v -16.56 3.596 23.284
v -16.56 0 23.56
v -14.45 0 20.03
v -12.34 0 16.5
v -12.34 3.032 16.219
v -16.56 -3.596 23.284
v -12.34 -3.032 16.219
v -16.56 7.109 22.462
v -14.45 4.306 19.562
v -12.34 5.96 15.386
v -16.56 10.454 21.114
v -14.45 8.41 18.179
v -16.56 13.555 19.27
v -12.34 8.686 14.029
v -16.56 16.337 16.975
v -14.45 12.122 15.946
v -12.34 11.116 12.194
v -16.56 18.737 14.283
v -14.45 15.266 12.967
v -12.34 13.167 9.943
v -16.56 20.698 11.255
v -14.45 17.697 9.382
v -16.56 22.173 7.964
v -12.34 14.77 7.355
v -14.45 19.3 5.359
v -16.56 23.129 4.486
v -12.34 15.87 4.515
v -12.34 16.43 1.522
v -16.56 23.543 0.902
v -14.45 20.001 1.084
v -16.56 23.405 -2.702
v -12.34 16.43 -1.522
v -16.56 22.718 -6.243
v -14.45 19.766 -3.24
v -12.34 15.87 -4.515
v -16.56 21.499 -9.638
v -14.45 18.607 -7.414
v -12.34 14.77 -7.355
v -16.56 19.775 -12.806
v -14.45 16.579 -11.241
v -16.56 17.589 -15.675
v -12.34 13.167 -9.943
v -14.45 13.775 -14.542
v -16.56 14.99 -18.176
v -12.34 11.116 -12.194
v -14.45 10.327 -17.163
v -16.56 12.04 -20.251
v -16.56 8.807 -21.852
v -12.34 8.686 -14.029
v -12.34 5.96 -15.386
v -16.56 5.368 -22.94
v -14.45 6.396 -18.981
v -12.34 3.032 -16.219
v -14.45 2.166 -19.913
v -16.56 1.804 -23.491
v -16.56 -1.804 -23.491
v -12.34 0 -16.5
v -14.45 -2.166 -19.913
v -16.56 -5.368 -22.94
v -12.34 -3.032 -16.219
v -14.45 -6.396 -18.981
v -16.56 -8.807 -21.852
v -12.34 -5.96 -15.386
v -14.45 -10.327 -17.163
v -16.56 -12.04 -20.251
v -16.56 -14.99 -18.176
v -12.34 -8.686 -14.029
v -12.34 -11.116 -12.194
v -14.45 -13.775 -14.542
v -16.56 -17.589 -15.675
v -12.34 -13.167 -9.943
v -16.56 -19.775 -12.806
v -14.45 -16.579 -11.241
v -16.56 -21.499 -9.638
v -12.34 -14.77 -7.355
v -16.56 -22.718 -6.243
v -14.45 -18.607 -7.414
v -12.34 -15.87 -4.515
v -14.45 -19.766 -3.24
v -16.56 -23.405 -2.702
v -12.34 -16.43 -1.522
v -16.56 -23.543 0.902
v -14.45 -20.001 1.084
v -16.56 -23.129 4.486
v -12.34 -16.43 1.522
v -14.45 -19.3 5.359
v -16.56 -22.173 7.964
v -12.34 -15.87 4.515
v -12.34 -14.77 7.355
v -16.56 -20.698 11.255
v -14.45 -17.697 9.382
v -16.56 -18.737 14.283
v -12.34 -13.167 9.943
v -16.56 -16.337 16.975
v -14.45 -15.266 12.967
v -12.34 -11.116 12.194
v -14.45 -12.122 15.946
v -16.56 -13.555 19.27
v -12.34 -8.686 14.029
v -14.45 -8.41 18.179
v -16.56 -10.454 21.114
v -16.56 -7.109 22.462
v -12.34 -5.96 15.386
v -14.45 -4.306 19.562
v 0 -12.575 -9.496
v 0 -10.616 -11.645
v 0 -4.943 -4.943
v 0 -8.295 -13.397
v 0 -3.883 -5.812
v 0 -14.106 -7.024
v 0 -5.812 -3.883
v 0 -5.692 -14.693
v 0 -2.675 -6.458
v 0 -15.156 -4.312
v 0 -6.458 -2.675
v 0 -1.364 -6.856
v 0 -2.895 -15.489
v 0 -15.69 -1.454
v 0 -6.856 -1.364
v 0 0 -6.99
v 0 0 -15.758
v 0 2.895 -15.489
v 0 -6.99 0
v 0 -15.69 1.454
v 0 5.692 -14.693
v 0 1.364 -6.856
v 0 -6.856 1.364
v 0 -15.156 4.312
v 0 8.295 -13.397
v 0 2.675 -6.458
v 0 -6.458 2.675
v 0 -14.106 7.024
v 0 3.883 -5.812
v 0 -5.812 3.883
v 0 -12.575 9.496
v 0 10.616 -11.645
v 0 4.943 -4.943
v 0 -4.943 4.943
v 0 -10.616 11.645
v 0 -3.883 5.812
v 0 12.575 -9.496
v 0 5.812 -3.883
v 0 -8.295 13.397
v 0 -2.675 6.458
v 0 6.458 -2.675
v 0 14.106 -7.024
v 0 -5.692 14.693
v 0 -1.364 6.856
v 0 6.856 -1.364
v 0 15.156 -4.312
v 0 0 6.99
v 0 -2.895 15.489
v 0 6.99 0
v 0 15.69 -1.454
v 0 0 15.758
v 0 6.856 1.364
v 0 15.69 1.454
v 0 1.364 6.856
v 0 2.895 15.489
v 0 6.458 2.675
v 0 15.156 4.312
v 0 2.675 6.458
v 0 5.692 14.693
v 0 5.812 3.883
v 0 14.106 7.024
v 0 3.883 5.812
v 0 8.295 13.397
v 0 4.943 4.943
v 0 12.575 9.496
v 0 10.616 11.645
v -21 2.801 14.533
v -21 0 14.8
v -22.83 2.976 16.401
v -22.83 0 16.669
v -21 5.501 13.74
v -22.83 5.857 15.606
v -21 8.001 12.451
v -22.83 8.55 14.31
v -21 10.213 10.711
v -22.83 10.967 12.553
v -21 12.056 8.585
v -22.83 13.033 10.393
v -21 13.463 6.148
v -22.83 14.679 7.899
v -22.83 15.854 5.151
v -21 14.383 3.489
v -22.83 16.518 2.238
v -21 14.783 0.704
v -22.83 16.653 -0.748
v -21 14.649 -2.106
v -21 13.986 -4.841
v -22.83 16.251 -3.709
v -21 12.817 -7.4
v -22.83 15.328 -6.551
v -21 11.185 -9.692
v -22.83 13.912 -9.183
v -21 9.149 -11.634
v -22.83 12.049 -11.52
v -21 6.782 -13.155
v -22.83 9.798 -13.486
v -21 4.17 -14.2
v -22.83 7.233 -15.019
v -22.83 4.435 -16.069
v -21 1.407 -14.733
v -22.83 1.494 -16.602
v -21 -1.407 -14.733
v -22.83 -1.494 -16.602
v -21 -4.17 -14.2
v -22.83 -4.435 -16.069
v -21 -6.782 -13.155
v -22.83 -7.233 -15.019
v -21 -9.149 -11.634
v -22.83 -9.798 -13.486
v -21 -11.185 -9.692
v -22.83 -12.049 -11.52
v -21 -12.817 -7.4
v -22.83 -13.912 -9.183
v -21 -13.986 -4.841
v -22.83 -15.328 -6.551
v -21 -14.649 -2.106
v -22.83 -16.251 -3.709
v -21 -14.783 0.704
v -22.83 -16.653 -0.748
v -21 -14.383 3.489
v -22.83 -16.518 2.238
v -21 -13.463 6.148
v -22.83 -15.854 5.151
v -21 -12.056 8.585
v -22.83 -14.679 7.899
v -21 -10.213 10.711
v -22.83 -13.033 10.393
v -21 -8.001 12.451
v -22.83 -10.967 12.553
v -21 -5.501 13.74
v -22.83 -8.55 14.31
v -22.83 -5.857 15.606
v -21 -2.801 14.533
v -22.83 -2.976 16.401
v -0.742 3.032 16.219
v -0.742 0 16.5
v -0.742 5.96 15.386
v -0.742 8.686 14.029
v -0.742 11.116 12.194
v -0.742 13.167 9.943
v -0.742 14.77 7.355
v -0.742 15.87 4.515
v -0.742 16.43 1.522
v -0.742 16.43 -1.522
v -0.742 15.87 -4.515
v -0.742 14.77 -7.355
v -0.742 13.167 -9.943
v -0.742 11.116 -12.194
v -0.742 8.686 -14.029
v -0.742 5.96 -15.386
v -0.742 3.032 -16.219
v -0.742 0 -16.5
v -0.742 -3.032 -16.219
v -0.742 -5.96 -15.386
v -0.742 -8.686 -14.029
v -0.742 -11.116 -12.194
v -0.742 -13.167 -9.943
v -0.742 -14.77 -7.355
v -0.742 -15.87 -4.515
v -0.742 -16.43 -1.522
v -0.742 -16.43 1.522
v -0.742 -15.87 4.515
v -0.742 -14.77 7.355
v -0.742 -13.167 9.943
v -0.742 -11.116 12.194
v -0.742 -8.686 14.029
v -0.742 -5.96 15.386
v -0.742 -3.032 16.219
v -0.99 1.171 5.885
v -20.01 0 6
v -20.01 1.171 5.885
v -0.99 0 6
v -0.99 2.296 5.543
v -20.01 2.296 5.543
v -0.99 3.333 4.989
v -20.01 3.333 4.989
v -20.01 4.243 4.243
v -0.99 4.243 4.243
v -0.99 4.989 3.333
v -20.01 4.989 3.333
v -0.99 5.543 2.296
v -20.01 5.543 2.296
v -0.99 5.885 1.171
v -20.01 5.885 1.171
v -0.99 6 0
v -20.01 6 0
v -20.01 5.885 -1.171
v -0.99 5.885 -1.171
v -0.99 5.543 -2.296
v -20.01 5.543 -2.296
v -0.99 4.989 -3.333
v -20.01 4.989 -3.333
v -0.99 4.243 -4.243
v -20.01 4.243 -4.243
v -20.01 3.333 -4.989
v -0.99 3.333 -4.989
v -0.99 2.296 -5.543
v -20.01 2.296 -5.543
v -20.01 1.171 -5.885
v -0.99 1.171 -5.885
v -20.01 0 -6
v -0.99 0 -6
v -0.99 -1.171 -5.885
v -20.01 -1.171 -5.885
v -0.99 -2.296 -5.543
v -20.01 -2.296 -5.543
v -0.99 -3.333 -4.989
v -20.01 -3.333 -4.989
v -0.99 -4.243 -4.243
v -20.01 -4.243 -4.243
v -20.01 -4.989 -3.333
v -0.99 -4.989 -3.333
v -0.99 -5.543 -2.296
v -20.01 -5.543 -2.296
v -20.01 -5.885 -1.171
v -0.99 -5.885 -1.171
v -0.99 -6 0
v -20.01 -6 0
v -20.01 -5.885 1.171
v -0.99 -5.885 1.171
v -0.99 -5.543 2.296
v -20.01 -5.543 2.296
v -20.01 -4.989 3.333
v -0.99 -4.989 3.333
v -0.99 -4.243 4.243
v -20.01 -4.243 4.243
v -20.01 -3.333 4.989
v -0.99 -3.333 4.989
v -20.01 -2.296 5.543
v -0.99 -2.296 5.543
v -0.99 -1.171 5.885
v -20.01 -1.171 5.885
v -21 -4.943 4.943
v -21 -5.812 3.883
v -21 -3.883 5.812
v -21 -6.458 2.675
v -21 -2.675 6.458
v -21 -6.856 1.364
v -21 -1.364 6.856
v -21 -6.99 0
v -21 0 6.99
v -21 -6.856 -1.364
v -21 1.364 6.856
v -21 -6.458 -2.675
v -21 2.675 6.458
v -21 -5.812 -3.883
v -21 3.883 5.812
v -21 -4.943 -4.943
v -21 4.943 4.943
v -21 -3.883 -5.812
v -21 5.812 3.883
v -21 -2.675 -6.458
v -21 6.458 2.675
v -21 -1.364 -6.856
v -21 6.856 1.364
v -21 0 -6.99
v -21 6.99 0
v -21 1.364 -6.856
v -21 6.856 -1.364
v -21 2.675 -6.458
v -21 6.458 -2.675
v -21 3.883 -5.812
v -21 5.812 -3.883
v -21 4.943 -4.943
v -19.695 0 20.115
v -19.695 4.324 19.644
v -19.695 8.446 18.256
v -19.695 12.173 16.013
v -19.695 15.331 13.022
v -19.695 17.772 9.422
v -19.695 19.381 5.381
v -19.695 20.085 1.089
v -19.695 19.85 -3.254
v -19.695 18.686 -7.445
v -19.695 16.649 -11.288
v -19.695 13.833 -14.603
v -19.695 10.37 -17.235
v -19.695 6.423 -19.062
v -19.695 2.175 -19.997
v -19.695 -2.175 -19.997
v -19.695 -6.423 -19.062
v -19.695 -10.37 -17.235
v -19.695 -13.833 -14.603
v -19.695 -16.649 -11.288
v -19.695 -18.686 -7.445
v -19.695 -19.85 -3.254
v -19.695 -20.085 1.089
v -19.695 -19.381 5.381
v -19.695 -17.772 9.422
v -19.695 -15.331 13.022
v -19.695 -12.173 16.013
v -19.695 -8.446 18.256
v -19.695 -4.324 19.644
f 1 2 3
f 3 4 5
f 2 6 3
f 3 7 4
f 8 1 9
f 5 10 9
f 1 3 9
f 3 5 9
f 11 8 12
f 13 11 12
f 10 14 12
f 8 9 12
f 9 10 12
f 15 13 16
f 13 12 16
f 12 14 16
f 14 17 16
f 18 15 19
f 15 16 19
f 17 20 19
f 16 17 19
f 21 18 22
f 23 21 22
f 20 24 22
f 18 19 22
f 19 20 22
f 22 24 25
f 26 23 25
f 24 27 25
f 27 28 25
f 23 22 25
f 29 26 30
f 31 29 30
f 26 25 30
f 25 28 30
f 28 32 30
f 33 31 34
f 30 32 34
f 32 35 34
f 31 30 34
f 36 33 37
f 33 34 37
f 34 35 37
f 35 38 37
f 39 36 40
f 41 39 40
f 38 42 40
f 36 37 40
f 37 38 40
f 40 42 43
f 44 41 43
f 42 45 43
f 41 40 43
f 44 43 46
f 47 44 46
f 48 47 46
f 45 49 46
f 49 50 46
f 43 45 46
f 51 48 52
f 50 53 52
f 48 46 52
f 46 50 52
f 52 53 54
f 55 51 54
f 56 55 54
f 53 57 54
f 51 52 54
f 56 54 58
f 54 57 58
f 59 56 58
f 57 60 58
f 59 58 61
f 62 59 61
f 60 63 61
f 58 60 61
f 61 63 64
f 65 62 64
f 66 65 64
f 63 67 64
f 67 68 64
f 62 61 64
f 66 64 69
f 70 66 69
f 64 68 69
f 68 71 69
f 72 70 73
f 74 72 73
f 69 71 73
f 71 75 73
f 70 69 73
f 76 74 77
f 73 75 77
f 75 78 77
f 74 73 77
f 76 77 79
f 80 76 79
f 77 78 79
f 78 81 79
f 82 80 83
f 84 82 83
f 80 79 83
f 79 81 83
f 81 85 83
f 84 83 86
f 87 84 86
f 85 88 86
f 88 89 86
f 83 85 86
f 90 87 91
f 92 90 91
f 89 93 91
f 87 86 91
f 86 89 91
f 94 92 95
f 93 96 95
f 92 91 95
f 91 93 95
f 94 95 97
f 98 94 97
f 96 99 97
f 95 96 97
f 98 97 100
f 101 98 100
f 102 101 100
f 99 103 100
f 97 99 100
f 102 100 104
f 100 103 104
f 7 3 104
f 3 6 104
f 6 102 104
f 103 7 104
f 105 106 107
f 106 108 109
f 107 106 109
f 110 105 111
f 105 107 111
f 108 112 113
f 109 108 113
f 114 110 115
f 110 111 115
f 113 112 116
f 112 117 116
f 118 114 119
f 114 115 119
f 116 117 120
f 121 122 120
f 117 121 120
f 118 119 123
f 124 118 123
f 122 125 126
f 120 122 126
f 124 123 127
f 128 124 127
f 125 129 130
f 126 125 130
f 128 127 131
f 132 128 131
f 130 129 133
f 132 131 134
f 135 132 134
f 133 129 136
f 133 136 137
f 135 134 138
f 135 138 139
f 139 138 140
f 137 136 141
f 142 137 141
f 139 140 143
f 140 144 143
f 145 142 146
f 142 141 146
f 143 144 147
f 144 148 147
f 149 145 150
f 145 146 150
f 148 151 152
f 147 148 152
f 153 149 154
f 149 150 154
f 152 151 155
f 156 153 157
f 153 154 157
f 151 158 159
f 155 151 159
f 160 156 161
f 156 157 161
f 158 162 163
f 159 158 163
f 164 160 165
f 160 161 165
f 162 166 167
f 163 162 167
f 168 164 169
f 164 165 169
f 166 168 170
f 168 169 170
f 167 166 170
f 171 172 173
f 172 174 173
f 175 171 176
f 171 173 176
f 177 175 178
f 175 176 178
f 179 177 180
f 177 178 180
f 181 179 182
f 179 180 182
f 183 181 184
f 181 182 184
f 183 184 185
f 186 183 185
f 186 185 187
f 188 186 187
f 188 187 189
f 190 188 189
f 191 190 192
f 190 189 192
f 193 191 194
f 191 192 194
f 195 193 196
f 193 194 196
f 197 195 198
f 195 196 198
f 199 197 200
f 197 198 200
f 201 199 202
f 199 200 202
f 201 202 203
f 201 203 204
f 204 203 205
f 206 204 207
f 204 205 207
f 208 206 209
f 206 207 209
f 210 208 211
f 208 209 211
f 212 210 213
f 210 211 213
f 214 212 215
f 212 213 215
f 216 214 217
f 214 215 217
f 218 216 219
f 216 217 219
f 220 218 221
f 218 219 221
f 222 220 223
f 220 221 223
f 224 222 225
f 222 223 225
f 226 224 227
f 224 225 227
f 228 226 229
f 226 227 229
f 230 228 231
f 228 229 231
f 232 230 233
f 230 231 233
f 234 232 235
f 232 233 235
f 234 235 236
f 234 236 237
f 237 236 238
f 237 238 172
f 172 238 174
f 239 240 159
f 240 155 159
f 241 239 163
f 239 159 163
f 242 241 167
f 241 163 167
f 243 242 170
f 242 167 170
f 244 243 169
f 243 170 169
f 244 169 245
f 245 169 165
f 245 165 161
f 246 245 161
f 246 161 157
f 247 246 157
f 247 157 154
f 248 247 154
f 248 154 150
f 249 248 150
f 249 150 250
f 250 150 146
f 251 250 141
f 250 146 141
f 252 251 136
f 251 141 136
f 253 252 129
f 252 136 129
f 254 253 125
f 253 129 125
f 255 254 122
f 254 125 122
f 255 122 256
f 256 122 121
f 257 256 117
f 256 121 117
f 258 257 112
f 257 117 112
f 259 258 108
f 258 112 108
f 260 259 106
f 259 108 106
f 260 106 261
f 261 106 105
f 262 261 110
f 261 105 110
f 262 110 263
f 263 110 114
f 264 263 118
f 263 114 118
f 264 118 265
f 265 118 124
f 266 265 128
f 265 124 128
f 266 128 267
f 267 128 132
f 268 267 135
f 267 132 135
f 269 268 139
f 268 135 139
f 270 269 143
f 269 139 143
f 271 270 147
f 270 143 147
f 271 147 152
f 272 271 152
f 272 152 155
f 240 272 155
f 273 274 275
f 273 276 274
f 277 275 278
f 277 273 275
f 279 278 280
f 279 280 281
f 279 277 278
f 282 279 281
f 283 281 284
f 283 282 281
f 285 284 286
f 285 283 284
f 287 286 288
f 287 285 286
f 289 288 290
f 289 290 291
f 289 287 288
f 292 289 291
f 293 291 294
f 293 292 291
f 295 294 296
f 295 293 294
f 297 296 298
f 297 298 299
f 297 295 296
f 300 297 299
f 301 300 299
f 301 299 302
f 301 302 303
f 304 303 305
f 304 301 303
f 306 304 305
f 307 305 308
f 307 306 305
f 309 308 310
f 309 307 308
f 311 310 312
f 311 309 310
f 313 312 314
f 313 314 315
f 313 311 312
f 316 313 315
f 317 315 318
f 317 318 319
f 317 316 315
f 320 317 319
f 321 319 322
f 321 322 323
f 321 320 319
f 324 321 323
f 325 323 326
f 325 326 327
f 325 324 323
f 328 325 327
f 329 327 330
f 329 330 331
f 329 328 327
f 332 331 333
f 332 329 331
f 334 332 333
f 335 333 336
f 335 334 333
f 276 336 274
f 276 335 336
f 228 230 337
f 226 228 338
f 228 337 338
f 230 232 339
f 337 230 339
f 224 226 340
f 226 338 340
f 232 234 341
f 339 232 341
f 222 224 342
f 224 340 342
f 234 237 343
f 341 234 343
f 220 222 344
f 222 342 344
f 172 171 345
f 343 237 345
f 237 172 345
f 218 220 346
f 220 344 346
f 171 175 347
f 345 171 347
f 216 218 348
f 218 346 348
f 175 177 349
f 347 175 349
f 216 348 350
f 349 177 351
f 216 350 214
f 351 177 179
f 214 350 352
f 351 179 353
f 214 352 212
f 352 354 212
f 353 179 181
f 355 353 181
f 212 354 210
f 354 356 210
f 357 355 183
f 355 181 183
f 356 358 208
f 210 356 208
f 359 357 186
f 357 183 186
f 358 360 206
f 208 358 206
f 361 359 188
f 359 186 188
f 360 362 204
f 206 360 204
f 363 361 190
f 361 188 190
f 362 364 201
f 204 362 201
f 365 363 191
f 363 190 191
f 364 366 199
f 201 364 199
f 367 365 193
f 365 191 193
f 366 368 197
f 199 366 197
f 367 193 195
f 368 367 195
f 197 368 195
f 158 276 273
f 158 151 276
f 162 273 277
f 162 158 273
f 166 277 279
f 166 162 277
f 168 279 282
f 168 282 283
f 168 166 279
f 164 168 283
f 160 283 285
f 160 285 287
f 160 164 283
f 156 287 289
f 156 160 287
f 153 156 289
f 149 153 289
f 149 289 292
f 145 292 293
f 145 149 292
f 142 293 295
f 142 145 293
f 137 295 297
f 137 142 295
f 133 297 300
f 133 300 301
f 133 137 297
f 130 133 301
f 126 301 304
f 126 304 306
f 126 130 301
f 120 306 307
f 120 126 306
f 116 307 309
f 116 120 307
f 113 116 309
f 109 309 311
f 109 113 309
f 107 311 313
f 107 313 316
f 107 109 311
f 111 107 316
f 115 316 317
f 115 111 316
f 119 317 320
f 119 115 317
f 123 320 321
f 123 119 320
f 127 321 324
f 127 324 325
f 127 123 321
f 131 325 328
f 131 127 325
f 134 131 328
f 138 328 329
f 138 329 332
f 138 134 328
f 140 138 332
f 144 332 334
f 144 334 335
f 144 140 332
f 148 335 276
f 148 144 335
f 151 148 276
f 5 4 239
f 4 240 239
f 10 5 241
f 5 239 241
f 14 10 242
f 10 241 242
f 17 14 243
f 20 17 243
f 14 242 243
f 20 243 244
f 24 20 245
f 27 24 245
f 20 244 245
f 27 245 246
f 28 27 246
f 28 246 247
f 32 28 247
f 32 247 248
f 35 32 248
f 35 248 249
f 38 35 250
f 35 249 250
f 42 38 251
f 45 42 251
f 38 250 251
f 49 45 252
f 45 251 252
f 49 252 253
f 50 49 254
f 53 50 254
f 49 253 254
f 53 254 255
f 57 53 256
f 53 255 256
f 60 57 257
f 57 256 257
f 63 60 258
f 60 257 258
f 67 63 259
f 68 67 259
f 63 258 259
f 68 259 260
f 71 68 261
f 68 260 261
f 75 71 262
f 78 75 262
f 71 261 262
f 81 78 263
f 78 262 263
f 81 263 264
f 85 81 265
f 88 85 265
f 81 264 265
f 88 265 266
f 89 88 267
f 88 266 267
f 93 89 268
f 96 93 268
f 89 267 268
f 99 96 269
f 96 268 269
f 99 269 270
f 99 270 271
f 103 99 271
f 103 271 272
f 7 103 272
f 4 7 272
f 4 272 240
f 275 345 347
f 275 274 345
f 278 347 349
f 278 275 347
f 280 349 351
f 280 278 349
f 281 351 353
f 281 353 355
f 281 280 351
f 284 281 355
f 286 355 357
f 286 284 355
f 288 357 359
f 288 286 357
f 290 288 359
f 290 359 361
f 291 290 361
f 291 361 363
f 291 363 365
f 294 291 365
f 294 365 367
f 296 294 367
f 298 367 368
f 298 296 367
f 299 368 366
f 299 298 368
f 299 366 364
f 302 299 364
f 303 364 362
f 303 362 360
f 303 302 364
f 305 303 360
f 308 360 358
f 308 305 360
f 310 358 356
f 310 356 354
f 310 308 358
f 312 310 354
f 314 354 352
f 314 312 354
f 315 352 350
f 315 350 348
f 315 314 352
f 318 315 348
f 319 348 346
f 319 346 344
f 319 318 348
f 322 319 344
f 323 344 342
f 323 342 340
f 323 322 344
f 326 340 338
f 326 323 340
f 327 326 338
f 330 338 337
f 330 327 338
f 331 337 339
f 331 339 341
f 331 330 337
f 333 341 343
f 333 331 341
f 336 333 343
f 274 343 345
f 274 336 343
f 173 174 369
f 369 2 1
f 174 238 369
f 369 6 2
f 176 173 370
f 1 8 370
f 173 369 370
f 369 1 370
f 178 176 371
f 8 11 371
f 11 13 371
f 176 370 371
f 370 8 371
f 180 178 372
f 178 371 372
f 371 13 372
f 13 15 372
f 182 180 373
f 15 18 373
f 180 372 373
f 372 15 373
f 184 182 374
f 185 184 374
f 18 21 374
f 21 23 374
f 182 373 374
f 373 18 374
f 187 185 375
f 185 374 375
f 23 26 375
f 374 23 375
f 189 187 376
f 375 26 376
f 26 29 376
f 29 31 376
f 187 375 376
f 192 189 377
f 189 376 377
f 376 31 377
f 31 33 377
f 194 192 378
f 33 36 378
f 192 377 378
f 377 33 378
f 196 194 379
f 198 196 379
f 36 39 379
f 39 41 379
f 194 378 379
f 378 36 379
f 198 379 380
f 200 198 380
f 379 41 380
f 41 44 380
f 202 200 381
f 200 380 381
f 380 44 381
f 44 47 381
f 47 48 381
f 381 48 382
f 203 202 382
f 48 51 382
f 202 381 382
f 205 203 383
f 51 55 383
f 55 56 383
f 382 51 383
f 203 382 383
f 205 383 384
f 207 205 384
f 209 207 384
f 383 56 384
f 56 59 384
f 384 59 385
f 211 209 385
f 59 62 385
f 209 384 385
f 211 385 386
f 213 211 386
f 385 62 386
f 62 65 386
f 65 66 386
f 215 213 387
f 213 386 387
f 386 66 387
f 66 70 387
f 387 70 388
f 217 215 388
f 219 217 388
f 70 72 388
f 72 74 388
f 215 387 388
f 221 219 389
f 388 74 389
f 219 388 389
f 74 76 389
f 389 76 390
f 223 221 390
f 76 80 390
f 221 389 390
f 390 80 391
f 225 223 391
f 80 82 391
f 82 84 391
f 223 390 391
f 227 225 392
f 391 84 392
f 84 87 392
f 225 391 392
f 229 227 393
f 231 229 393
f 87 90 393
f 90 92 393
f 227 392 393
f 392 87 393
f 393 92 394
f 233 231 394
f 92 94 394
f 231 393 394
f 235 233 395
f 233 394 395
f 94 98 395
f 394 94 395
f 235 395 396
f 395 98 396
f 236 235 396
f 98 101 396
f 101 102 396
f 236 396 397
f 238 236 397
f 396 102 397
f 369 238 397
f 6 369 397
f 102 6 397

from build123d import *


with BuildPart() as part:
    # 草图1 → 旋转1 (revolve)
    with BuildSketch(Plane.XY, mode=Mode.PRIVATE) as revolve_1_sk:
        Polygon((-21, 0), (-21, 14.8), (-22.83, 16.669359971), (-16.56, 23.56), (-12.34, 16.5), (-0.74246212, 16.5), (0, 15.75753788), (0, 0), align=None)
    revolve(revolve_1_sk.sketch.rotate(Axis((0, 0, 0), (-1, 0, 0)), 270), axis=Axis((0, 0, 0), (-1, 0, 0)))

    # 草图2 → 切除-旋转1 (revolve, cut)
    with BuildSketch(Plane.XY, mode=Mode.PRIVATE) as cut_revolve_1_sk:
        Polygon((-21, 0), (-21, 6.99), (-20.01, 6), (-0.99, 6), (0, 6.99), (0, 0), align=None)
    revolve(cut_revolve_1_sk.sketch.rotate(Axis((0, 0, 0), (-1, 0, 0)), 270), axis=Axis((0, 0, 0), (-1, 0, 0)), mode=Mode.SUBTRACT)


solid = part.part
